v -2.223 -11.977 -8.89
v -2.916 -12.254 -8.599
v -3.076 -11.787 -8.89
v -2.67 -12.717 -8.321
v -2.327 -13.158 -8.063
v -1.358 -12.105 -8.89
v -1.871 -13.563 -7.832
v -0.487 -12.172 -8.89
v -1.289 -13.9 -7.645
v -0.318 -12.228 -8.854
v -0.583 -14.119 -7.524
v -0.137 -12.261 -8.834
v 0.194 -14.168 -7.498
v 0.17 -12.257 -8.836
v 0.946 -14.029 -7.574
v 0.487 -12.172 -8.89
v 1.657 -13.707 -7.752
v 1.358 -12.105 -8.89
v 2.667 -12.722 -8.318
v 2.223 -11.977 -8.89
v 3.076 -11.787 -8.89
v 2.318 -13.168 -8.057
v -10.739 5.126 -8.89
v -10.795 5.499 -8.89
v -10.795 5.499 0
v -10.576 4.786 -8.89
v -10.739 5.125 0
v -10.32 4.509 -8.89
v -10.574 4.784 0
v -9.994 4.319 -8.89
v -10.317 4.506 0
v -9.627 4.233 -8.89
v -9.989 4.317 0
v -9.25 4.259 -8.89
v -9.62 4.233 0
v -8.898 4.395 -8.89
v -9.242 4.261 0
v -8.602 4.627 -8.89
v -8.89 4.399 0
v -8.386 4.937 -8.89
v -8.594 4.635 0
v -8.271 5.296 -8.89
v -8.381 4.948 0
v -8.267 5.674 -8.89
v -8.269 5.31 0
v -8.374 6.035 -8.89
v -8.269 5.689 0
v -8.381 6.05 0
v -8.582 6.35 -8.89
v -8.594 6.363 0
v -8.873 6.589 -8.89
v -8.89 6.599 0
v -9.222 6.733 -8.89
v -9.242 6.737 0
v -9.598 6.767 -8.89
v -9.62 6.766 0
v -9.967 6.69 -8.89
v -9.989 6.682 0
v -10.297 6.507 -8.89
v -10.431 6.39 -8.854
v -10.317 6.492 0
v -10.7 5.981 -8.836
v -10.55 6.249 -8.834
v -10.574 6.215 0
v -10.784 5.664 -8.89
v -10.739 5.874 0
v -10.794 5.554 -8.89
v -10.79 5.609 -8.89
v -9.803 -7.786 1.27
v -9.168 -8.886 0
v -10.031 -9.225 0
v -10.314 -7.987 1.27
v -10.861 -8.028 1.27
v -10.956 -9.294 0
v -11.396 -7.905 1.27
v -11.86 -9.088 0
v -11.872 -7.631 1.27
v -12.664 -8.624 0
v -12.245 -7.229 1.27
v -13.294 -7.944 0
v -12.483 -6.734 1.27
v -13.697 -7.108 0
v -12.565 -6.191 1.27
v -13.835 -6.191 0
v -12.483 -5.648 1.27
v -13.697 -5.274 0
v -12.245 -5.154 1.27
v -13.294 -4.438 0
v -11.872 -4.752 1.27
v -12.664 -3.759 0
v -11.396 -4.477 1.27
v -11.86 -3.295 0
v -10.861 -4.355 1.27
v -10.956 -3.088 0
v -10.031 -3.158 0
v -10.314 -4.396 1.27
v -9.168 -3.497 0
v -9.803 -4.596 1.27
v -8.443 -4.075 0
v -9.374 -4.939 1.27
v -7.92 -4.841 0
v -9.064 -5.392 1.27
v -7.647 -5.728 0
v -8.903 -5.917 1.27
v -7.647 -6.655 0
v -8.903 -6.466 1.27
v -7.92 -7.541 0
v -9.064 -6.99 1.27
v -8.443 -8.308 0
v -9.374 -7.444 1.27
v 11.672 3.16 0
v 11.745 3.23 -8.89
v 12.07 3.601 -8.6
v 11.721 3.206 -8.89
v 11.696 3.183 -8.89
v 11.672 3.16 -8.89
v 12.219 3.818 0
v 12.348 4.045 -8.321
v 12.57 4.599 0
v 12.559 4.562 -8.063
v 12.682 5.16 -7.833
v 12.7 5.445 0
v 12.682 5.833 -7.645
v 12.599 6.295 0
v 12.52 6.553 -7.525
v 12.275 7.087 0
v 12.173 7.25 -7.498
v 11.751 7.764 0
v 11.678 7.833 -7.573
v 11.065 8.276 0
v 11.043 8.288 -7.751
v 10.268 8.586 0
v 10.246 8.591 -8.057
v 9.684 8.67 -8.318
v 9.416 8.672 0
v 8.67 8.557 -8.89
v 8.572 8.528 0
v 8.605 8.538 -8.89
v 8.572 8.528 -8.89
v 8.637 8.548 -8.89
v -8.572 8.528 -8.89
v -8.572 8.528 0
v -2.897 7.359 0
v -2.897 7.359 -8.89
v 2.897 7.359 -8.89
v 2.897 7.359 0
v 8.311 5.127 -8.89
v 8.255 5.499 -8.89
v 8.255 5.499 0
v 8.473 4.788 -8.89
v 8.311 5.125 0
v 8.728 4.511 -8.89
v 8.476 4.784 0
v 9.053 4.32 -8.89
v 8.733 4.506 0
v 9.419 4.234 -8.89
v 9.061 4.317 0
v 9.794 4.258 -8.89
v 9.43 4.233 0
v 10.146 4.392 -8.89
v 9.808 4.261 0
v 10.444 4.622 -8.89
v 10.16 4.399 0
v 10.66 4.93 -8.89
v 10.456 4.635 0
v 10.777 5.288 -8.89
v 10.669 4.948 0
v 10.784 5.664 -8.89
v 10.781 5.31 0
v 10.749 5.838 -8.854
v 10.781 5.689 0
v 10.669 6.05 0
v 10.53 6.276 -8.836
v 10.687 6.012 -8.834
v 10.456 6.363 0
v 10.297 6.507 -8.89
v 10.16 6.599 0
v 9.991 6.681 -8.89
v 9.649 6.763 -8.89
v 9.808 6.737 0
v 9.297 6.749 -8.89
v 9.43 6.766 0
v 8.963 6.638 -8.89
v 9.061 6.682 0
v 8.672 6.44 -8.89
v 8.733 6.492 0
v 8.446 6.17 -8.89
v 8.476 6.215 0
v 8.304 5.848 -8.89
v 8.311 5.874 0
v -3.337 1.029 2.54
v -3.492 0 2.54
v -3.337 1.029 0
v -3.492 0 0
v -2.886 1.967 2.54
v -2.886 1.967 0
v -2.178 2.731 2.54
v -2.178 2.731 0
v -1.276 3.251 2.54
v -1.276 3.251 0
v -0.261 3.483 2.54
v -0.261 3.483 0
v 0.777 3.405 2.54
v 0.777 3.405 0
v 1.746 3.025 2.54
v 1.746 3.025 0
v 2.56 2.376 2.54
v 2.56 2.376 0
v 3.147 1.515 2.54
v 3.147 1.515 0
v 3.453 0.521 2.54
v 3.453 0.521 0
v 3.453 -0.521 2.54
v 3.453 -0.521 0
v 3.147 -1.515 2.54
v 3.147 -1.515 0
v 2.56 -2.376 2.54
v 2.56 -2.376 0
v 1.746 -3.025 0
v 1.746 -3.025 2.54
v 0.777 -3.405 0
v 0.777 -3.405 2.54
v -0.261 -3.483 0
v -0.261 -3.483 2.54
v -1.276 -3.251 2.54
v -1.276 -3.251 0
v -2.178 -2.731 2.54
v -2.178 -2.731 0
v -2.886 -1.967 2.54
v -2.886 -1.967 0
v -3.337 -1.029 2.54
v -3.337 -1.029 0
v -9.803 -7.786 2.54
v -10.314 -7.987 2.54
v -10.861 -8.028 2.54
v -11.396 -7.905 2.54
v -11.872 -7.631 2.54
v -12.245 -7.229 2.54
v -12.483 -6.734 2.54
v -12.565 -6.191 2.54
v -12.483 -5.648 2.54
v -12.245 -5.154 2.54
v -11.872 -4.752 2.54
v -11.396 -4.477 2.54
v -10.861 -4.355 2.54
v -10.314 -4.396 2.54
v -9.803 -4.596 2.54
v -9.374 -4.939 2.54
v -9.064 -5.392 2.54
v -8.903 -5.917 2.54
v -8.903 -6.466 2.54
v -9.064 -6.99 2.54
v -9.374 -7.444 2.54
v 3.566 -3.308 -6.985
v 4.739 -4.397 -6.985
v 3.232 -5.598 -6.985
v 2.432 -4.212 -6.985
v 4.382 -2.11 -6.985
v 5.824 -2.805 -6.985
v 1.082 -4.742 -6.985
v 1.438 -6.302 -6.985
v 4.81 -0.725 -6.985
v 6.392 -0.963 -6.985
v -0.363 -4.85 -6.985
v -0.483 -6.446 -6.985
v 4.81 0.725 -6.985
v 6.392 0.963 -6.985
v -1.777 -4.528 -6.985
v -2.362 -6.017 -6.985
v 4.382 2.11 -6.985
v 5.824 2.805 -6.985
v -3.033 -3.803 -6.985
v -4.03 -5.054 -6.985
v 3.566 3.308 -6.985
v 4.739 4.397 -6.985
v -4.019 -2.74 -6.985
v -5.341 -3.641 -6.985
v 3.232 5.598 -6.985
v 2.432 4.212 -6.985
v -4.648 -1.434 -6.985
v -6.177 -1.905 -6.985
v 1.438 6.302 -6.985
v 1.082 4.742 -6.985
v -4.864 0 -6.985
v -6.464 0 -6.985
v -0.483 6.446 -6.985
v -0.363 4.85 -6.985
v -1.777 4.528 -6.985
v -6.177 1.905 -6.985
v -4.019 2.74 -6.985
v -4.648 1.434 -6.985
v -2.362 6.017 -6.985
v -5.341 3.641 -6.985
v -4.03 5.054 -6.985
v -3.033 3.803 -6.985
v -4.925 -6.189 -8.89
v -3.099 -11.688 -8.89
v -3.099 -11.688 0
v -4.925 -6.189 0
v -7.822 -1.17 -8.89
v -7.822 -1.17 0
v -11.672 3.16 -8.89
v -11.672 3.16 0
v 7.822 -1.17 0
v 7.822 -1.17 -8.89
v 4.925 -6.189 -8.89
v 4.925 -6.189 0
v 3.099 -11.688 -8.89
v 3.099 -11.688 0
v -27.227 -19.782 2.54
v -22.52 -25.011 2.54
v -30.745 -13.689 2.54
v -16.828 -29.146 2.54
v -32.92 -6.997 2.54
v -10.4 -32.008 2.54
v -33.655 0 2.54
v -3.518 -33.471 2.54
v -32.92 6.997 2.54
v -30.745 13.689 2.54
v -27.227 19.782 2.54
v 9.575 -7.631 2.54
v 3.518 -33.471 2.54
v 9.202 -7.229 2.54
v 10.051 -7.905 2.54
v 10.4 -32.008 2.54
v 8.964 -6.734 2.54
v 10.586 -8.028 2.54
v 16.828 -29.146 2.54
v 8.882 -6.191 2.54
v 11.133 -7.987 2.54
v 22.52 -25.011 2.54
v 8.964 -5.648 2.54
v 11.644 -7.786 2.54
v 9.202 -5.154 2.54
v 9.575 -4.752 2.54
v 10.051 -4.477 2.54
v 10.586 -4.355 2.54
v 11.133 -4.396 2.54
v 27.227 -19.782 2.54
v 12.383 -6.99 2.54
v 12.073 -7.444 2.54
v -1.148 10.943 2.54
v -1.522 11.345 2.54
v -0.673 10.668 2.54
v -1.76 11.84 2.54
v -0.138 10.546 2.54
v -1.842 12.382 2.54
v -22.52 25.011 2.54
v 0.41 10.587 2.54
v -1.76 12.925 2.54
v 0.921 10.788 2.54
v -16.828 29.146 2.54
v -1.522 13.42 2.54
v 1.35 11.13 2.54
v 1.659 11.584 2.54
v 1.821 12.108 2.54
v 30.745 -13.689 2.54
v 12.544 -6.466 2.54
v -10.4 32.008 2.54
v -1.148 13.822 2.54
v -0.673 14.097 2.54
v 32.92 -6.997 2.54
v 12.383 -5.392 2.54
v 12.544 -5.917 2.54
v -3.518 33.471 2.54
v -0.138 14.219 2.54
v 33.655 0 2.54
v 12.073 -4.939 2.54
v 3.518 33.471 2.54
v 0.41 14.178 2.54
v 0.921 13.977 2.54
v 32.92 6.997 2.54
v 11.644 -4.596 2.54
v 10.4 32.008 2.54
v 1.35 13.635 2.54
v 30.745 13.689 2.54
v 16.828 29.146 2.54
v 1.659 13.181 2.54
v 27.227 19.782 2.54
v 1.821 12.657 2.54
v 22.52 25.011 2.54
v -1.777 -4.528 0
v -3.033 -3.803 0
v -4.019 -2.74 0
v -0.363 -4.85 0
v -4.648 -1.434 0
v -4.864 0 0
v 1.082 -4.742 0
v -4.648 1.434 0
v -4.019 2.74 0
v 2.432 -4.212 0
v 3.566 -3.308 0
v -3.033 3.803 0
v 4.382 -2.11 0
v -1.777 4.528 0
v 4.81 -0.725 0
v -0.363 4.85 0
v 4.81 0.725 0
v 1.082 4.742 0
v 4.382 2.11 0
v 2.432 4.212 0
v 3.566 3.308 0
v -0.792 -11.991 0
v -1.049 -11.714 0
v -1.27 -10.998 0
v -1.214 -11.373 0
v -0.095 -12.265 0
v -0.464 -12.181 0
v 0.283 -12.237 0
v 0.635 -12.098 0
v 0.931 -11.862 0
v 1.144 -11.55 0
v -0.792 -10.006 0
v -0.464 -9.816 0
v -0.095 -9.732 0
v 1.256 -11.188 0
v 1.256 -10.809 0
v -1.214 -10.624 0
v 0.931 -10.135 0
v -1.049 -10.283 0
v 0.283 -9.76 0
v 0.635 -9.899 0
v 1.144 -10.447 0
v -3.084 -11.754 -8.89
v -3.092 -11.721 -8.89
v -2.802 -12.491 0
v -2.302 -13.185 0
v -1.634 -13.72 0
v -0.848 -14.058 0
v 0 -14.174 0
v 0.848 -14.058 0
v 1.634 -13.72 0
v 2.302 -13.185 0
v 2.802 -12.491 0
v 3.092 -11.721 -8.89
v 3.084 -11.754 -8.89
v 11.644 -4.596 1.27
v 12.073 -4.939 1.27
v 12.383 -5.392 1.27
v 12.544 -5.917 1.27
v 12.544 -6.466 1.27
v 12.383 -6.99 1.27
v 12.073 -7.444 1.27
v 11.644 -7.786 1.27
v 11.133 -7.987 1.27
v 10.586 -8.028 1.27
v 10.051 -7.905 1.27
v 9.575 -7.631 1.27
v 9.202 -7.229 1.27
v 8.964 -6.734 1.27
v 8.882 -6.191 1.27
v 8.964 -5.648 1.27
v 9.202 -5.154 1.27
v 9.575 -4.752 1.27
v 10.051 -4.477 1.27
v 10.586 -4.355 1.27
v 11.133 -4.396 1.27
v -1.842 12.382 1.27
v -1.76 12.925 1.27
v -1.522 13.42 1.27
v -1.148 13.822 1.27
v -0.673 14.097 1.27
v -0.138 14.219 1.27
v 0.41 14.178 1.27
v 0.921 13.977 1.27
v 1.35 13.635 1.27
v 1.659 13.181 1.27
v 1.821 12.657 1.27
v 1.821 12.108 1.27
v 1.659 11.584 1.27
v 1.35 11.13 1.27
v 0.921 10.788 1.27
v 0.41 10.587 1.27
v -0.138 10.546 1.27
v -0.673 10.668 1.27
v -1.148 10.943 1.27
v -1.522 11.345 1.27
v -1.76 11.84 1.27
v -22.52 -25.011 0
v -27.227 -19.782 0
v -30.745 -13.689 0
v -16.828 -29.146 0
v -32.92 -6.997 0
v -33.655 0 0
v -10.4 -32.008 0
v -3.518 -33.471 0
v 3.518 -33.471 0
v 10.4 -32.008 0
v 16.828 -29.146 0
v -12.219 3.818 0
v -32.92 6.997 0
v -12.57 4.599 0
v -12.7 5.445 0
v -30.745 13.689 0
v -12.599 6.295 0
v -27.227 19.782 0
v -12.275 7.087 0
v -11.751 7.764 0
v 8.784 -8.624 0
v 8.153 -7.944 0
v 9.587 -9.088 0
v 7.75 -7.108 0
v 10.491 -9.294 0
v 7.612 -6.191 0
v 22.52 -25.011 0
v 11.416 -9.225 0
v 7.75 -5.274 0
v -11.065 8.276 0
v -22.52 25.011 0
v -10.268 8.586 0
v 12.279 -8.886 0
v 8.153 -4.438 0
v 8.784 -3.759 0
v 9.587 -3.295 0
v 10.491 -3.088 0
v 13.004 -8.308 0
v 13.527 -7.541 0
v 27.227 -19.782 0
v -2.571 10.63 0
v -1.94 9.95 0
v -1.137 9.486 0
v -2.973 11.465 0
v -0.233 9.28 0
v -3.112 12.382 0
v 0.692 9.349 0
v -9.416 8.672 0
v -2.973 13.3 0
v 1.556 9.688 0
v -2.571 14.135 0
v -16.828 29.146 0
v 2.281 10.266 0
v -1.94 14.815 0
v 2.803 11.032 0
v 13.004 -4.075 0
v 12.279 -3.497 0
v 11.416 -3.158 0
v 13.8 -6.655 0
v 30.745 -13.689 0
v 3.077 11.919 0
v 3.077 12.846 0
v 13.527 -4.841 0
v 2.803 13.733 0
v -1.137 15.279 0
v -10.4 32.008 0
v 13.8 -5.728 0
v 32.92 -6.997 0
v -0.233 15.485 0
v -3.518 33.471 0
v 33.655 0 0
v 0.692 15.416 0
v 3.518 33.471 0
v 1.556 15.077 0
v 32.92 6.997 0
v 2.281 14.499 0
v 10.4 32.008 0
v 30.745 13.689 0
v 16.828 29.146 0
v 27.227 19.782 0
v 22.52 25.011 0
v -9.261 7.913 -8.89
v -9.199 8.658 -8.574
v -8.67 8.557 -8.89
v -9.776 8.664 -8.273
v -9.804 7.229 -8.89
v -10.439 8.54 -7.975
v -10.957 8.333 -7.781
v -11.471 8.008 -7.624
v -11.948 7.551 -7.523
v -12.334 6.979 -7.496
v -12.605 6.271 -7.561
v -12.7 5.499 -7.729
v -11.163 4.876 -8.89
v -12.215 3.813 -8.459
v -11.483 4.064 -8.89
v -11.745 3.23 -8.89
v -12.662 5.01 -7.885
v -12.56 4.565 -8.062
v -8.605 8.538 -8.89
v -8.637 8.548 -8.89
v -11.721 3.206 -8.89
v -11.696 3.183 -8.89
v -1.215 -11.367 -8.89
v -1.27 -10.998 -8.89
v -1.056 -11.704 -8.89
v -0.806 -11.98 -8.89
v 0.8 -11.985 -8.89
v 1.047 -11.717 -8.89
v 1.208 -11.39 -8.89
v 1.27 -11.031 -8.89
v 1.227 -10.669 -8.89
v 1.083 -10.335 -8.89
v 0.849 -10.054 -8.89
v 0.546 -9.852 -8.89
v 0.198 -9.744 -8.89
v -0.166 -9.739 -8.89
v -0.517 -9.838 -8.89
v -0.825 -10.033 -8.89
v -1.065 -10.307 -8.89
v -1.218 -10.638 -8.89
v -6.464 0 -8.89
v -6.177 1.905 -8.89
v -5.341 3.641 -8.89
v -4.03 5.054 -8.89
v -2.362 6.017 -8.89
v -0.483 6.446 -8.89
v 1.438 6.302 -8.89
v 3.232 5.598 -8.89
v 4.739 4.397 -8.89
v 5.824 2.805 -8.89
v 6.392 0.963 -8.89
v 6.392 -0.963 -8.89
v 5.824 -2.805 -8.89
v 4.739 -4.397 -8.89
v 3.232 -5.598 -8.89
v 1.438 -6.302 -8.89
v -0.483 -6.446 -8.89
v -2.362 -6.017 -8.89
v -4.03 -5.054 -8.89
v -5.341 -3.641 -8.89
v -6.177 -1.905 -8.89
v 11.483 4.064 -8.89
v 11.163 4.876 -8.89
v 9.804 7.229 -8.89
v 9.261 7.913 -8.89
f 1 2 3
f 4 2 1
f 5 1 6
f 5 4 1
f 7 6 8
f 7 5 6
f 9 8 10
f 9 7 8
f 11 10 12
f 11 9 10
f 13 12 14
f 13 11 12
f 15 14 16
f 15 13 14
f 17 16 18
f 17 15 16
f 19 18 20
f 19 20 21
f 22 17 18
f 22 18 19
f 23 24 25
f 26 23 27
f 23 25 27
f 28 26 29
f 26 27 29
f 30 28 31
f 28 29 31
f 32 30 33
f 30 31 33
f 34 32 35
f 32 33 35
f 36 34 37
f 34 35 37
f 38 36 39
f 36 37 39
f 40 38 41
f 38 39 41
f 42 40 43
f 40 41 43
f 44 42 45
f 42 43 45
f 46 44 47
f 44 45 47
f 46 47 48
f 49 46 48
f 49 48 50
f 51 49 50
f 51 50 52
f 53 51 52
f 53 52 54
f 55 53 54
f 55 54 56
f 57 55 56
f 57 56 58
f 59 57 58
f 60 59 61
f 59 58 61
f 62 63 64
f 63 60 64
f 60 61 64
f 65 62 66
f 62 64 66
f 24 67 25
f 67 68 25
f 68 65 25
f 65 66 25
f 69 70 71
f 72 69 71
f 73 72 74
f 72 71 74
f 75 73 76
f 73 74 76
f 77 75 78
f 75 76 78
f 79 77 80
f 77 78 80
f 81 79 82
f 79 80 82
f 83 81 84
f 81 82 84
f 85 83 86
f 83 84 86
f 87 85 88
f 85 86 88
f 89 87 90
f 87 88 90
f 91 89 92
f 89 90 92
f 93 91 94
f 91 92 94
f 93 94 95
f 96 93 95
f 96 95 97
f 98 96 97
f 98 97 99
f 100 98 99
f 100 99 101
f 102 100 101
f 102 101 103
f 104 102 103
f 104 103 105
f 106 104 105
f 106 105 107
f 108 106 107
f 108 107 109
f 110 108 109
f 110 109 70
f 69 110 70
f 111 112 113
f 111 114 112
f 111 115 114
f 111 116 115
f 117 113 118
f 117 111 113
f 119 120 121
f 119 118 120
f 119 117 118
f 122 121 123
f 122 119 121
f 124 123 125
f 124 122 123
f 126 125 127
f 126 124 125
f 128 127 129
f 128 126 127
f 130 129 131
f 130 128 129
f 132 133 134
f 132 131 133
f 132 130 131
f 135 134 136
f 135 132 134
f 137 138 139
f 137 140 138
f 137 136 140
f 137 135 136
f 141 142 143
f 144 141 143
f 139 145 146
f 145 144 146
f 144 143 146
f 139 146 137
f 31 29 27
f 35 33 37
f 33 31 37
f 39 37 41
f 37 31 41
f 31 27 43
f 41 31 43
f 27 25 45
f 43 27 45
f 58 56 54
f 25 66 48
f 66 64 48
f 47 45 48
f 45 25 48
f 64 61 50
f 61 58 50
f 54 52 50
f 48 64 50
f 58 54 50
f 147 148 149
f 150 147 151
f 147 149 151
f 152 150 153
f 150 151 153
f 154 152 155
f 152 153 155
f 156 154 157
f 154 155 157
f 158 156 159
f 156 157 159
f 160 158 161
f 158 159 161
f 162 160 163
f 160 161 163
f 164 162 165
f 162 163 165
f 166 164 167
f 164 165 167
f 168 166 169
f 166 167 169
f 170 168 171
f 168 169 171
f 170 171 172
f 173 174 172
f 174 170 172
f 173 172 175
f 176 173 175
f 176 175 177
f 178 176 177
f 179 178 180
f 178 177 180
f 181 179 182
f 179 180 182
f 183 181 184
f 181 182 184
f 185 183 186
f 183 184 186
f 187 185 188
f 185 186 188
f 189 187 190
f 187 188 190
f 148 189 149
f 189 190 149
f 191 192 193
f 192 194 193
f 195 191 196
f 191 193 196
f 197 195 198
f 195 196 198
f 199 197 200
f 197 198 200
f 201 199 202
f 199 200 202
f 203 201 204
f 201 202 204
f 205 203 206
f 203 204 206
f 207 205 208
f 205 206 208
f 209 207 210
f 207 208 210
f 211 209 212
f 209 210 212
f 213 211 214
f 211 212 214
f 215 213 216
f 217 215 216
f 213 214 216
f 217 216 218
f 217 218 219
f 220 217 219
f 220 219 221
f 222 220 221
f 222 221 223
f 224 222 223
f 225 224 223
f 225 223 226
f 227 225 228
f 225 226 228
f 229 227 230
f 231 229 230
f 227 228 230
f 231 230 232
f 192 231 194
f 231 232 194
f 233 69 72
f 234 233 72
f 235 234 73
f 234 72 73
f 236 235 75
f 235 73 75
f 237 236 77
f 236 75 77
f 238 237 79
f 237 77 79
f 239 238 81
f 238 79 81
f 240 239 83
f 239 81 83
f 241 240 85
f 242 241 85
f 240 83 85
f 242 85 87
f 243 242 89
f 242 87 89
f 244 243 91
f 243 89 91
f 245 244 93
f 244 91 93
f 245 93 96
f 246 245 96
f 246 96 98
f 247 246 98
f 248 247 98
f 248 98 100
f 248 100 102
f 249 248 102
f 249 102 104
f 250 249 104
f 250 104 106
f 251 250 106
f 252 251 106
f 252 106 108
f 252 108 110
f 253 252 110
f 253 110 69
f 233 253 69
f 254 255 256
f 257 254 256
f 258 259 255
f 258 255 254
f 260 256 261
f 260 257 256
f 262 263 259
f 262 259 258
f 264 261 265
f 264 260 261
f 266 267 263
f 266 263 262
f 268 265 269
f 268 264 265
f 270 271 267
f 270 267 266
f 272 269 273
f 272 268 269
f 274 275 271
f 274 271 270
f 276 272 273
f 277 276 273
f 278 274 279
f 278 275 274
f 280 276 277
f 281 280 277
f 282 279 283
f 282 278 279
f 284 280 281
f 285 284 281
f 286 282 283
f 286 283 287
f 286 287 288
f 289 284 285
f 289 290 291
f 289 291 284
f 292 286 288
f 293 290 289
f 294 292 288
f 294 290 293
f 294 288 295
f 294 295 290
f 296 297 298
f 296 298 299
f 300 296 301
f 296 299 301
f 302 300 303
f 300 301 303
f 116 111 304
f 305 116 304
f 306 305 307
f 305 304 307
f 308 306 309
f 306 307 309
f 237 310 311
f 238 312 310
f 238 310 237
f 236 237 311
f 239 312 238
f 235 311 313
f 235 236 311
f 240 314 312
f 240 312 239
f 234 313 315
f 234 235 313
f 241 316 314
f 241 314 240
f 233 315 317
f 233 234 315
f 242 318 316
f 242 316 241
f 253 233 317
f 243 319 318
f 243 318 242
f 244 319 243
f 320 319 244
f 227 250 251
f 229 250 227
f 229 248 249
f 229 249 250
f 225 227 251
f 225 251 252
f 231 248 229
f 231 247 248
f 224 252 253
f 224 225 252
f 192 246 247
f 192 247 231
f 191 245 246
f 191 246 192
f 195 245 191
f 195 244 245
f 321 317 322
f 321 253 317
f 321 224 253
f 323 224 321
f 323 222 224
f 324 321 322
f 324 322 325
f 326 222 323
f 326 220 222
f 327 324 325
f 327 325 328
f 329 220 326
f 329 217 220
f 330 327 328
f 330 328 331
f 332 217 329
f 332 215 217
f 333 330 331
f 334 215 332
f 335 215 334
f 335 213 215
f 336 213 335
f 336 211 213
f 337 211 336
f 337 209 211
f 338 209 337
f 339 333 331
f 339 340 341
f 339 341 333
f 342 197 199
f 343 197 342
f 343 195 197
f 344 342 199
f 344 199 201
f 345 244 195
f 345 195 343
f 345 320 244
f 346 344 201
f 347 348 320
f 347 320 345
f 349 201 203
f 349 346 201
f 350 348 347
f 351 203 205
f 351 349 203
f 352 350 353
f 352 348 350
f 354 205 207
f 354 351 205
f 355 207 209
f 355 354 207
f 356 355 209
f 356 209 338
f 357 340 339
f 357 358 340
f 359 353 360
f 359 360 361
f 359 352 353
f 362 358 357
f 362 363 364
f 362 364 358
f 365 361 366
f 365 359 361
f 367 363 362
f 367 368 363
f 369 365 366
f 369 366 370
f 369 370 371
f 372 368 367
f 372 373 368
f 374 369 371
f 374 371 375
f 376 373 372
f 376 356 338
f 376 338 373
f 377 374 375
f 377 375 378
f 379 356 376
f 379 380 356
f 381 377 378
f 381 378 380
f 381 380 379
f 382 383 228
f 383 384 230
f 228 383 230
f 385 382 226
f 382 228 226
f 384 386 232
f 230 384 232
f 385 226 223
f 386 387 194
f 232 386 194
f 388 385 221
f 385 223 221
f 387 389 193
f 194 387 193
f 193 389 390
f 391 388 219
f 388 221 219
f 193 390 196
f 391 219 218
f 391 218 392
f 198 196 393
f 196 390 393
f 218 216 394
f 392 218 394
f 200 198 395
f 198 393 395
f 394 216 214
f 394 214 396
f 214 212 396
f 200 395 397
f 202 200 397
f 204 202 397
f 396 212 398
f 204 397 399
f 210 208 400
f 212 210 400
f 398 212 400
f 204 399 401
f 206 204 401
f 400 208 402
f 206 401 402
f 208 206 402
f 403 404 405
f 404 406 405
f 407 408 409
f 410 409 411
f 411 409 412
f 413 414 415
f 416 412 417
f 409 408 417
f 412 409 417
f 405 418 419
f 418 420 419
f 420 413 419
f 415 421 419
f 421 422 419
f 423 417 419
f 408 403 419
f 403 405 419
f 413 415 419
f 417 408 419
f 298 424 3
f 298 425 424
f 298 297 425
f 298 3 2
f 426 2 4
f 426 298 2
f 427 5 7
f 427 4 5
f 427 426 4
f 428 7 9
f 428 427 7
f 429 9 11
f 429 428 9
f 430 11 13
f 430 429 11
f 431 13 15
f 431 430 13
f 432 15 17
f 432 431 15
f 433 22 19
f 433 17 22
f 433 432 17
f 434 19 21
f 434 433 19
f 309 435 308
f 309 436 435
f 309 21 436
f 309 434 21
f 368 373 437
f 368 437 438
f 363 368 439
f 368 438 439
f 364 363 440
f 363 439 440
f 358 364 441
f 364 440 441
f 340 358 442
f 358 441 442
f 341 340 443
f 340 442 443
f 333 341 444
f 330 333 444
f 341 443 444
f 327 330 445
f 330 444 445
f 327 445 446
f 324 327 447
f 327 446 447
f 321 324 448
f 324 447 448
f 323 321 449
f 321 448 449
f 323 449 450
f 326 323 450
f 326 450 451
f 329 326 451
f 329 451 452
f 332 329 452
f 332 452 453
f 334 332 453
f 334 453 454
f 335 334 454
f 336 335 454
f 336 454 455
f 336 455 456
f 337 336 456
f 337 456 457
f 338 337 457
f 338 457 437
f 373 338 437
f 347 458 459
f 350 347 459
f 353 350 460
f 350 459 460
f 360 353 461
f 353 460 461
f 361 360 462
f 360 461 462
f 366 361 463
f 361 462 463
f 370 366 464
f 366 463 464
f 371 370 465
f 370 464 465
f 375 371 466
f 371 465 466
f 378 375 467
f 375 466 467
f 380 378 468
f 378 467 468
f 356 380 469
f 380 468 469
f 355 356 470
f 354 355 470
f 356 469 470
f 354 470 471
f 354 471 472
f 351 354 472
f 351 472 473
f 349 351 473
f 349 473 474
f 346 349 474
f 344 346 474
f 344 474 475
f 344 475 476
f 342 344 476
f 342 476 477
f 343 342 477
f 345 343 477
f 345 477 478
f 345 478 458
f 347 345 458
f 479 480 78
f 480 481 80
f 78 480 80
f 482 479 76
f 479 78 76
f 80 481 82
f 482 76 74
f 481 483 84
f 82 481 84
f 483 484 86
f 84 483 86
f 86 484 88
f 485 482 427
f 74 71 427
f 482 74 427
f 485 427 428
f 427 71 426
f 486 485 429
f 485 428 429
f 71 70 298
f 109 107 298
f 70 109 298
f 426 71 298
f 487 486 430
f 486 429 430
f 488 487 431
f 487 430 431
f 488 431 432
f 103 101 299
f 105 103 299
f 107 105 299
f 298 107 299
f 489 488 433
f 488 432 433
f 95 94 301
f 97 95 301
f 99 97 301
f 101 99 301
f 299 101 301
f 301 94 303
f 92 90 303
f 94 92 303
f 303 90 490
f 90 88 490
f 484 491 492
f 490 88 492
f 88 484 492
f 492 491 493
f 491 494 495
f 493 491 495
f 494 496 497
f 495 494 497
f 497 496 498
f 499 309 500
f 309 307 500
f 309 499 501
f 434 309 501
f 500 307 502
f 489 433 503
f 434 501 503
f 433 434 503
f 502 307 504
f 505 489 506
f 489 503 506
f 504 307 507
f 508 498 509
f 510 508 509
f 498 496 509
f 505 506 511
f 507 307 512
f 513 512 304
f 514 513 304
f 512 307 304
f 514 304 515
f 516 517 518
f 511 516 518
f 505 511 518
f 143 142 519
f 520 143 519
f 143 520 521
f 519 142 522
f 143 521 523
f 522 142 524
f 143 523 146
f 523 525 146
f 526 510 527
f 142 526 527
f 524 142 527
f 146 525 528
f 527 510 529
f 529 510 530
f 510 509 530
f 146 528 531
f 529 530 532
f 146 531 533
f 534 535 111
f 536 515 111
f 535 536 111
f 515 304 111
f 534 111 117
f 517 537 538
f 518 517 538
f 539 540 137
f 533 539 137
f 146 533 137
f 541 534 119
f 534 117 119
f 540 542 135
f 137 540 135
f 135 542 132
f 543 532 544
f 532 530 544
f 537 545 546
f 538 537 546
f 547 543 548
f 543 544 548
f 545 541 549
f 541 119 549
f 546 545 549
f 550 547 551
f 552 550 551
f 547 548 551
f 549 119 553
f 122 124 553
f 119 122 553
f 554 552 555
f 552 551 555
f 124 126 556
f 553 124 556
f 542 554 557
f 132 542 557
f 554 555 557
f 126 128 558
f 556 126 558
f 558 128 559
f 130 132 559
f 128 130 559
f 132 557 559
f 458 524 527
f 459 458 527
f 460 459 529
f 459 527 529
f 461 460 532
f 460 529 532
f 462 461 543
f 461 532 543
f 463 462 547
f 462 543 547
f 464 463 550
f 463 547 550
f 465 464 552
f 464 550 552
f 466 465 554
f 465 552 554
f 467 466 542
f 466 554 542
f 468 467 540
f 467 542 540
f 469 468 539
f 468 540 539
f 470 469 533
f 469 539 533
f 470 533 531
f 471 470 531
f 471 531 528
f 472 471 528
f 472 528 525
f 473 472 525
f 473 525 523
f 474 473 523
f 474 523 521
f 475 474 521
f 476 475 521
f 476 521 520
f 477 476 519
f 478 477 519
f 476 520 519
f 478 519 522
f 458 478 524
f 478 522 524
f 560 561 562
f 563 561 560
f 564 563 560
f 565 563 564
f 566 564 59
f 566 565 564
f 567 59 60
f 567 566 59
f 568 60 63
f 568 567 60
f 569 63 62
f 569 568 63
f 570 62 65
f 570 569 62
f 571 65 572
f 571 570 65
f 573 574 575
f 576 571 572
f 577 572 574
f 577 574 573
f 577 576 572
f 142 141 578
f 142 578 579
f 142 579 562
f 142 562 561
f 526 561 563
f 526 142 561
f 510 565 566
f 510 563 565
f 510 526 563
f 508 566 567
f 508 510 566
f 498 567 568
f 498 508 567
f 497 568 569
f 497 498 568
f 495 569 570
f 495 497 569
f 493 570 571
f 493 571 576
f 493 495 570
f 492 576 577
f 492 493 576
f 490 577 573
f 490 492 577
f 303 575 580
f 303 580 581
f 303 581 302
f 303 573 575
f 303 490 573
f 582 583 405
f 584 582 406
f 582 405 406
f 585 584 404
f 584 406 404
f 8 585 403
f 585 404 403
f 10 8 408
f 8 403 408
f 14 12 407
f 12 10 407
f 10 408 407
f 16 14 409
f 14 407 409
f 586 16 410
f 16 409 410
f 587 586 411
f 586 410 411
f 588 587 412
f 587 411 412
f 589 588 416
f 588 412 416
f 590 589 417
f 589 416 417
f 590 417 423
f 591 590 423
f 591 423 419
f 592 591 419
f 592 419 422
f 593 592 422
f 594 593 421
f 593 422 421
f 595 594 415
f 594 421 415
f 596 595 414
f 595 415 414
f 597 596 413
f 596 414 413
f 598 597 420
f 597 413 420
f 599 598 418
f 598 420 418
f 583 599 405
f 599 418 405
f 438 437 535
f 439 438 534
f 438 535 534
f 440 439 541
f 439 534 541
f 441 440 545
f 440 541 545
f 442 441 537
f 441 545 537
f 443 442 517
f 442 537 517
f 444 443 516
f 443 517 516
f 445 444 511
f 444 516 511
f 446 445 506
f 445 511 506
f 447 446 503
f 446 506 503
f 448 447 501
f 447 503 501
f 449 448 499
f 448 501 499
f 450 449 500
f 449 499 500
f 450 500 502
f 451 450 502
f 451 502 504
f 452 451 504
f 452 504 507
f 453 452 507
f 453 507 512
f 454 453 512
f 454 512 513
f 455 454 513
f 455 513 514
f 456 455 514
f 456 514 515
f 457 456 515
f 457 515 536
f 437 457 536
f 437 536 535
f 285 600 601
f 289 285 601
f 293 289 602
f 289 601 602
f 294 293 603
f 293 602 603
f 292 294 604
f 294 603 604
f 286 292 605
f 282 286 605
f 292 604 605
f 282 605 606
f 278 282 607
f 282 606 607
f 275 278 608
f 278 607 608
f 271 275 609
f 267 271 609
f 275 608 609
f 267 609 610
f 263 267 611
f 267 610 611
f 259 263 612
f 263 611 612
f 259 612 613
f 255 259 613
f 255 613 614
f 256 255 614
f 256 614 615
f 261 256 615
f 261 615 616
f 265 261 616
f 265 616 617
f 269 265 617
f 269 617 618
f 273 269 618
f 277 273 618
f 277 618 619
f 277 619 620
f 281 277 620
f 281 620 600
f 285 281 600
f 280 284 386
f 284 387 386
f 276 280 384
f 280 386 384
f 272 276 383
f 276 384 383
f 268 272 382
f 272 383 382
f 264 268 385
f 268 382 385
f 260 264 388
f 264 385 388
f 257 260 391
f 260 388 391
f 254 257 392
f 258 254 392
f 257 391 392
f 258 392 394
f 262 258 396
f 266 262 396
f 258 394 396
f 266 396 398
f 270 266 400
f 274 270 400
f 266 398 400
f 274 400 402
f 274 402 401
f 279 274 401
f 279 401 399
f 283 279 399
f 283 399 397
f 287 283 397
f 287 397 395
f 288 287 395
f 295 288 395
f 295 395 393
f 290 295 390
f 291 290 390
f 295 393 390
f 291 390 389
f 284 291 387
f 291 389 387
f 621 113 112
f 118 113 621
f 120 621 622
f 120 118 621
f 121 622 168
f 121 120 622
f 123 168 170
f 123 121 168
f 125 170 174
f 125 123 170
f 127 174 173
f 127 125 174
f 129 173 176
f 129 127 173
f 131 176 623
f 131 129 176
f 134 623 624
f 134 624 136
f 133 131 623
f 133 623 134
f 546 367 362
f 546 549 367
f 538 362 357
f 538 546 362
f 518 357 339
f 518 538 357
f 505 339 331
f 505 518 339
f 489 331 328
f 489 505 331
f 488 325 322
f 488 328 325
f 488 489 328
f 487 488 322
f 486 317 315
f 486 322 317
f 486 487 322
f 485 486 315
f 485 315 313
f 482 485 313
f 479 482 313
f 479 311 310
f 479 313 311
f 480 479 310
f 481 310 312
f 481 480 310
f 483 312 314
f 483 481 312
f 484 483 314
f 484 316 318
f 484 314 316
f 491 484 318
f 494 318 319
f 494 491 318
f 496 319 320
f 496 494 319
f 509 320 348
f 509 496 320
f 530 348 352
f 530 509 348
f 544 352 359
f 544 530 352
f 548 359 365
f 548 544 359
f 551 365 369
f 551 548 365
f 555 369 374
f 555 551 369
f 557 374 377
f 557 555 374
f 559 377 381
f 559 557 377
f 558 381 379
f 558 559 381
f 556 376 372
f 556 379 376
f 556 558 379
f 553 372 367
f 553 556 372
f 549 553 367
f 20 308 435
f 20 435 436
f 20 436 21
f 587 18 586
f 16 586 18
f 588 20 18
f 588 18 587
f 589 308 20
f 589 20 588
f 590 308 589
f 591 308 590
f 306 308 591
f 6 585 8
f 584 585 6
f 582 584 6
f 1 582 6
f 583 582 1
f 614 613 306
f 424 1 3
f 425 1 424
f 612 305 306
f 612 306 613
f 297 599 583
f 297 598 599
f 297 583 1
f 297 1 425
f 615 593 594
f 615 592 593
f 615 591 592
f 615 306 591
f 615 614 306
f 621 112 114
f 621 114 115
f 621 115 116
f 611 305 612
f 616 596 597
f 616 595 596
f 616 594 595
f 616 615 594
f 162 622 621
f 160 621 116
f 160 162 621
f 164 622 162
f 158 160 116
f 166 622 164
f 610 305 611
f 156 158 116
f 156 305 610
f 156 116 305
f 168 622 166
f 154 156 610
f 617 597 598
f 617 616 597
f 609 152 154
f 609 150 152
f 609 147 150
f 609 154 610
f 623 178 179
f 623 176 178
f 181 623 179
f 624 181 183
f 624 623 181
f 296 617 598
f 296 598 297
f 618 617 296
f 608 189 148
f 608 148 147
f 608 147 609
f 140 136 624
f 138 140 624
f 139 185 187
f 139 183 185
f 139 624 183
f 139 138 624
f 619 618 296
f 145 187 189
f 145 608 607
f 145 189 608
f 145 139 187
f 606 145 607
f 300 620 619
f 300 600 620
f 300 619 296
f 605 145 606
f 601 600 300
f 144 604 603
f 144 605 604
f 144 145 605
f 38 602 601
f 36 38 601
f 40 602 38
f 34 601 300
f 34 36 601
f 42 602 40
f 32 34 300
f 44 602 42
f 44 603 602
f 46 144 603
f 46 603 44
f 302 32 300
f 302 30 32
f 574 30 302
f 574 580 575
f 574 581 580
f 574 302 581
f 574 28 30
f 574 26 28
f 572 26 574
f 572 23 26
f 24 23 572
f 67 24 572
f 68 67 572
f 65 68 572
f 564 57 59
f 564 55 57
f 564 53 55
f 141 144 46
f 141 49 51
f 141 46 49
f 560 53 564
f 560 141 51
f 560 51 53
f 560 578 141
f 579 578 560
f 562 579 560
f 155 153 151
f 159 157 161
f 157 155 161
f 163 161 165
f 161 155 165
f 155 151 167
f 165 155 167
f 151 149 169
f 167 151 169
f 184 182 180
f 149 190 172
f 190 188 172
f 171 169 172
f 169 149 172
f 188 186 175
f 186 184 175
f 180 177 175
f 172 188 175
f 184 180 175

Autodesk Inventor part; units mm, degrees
ref_plane "YZ Plane" through (0, 0, 0) normal (1, 0, 0) x (0, 1, 0)
ref_plane "XZ Plane" through (0, 0, 0) normal (0, 1, 0) x (-1, 0, 0)
ref_plane "XY Plane" through (0, 0, 0) normal (0, 0, 1) x (1, 0, 0)
sketch "Sketch1" plane through (0, 0, 0) normal (0, 0, 1) x (1, 0, 0)
  circle A0 centre (0, 0) radius 33.655
  dimension "d0" = 67.31
extrude "Extrusion1" add sketch "Sketch1" along normal blind 2.54
sketch "Sketch2" plane through (0, 0, 0) normal (0, 0, -1) x (-1, 0, 0)
  circle A0 centre (0, 12.3825) radius 1.8415
  point P0 (0, 0)
  dimension "d3" = 3.683
  dimension "d4" = 12.3825
extrude "Extrusion2" cut sketch "Sketch2" against normal through all
chamfer "Chamfer1" distance 1.27 angle 45 1 edges at (1.8415, 12.3825, 0)
pattern_circular "Circular Pattern1" count 3 over 360 about axis through (0, 0, 0) along (0, 0, 1) of "Extrusion2", "Chamfer1"
sketch "Sketch3" plane through (0, 0, 0) normal (0, 0, -1) x (-1, 0, 0)
  circle A0 centre (0, 0) radius 3.4925
  circle A1 centre (0, 0) radius 4.8641
  line L0 (0, 0) -> (9.525, 5.4993) construction
  line L1 (0, 0) -> (10.9985, 0) construction
  circle A2 centre (9.525, 5.4993) radius 1.27
  circle A3 centre (9.525, 5.4993) radius 3.175
  line L2 (0, 0) -> (-9.525, 5.4993) construction
  line L3 (0, 0) -> (10.9985, 0) construction
  line L4 (0, 0) -> (0, -10.9985) construction
  circle A4 centre (-9.525, 5.4993) radius 1.27
  circle A5 centre (-9.525, 5.4993) radius 3.175
  circle A6 centre (0, -10.9985) radius 1.27
  circle A7 centre (0, -10.9985) radius 3.175
  arc A8 (-8.5725, 8.528) -> (8.5725, 8.528) centre (0, 35.7868) ccw
  arc A9 (11.6717, 3.16) -> (3.0992, -11.688) centre (30.9923, -17.8934) ccw
  arc A10 (-3.0992, -11.688) -> (-11.6717, 3.16) centre (-30.9923, -17.8934) ccw
  dimension "d13" = 6.985
  dimension "d14" = 9.7282
  dimension "d15" = 30
  dimension "d16" = 2.54
  dimension "d17" = 6.35
  dimension "d18" = 150
  dimension "d19" = 19.05
  dimension "d20" = 28.575
extrude "Extrusion3" add sketch "Sketch3" along normal blind 8.89 contours A3 | A3 A9 A7 A10 A5 A8 | A5 | A7
extrude "Extrusion4" cut sketch "Sketch3" against normal through all contours A0
sketch "Sketch4" plane through (0, 0, 0) normal (1, 0, 0) x (0, 1, 0)
  line L0 (10.541, -10.0385) -> (19.3172, -3.8934)
  line L1 (19.3172, -3.8934) -> (19.3172, -10.0385)
  line L2 (19.3172, -10.0385) -> (10.541, -10.0385)
  line L3 (33.655, 2.54) -> (-33.655, 2.54) construction
  line L4 (0, 2.54) -> (0, 18.6348) construction
  point P0 (0, 0)
  dimension "d25" = 10.541
  dimension "d26" = 35
revolve "Revolution1" cut sketch "Sketch4" angle 360 about axis through (0, 0, 2.54) along (0, 0, 1)
sketch "Sketch5" plane through (0, 0, -8.89) normal (0, 0, -1) x (-1, 0, 0)
  circle A0 centre (0, 0) radius 6.4643
  dimension "d28" = 12.9286
extrude "Extrusion5" cut sketch "Sketch5" against normal blind 1.905
properties part number "SmallSpoolEndAft" material "ABS Plastic"
